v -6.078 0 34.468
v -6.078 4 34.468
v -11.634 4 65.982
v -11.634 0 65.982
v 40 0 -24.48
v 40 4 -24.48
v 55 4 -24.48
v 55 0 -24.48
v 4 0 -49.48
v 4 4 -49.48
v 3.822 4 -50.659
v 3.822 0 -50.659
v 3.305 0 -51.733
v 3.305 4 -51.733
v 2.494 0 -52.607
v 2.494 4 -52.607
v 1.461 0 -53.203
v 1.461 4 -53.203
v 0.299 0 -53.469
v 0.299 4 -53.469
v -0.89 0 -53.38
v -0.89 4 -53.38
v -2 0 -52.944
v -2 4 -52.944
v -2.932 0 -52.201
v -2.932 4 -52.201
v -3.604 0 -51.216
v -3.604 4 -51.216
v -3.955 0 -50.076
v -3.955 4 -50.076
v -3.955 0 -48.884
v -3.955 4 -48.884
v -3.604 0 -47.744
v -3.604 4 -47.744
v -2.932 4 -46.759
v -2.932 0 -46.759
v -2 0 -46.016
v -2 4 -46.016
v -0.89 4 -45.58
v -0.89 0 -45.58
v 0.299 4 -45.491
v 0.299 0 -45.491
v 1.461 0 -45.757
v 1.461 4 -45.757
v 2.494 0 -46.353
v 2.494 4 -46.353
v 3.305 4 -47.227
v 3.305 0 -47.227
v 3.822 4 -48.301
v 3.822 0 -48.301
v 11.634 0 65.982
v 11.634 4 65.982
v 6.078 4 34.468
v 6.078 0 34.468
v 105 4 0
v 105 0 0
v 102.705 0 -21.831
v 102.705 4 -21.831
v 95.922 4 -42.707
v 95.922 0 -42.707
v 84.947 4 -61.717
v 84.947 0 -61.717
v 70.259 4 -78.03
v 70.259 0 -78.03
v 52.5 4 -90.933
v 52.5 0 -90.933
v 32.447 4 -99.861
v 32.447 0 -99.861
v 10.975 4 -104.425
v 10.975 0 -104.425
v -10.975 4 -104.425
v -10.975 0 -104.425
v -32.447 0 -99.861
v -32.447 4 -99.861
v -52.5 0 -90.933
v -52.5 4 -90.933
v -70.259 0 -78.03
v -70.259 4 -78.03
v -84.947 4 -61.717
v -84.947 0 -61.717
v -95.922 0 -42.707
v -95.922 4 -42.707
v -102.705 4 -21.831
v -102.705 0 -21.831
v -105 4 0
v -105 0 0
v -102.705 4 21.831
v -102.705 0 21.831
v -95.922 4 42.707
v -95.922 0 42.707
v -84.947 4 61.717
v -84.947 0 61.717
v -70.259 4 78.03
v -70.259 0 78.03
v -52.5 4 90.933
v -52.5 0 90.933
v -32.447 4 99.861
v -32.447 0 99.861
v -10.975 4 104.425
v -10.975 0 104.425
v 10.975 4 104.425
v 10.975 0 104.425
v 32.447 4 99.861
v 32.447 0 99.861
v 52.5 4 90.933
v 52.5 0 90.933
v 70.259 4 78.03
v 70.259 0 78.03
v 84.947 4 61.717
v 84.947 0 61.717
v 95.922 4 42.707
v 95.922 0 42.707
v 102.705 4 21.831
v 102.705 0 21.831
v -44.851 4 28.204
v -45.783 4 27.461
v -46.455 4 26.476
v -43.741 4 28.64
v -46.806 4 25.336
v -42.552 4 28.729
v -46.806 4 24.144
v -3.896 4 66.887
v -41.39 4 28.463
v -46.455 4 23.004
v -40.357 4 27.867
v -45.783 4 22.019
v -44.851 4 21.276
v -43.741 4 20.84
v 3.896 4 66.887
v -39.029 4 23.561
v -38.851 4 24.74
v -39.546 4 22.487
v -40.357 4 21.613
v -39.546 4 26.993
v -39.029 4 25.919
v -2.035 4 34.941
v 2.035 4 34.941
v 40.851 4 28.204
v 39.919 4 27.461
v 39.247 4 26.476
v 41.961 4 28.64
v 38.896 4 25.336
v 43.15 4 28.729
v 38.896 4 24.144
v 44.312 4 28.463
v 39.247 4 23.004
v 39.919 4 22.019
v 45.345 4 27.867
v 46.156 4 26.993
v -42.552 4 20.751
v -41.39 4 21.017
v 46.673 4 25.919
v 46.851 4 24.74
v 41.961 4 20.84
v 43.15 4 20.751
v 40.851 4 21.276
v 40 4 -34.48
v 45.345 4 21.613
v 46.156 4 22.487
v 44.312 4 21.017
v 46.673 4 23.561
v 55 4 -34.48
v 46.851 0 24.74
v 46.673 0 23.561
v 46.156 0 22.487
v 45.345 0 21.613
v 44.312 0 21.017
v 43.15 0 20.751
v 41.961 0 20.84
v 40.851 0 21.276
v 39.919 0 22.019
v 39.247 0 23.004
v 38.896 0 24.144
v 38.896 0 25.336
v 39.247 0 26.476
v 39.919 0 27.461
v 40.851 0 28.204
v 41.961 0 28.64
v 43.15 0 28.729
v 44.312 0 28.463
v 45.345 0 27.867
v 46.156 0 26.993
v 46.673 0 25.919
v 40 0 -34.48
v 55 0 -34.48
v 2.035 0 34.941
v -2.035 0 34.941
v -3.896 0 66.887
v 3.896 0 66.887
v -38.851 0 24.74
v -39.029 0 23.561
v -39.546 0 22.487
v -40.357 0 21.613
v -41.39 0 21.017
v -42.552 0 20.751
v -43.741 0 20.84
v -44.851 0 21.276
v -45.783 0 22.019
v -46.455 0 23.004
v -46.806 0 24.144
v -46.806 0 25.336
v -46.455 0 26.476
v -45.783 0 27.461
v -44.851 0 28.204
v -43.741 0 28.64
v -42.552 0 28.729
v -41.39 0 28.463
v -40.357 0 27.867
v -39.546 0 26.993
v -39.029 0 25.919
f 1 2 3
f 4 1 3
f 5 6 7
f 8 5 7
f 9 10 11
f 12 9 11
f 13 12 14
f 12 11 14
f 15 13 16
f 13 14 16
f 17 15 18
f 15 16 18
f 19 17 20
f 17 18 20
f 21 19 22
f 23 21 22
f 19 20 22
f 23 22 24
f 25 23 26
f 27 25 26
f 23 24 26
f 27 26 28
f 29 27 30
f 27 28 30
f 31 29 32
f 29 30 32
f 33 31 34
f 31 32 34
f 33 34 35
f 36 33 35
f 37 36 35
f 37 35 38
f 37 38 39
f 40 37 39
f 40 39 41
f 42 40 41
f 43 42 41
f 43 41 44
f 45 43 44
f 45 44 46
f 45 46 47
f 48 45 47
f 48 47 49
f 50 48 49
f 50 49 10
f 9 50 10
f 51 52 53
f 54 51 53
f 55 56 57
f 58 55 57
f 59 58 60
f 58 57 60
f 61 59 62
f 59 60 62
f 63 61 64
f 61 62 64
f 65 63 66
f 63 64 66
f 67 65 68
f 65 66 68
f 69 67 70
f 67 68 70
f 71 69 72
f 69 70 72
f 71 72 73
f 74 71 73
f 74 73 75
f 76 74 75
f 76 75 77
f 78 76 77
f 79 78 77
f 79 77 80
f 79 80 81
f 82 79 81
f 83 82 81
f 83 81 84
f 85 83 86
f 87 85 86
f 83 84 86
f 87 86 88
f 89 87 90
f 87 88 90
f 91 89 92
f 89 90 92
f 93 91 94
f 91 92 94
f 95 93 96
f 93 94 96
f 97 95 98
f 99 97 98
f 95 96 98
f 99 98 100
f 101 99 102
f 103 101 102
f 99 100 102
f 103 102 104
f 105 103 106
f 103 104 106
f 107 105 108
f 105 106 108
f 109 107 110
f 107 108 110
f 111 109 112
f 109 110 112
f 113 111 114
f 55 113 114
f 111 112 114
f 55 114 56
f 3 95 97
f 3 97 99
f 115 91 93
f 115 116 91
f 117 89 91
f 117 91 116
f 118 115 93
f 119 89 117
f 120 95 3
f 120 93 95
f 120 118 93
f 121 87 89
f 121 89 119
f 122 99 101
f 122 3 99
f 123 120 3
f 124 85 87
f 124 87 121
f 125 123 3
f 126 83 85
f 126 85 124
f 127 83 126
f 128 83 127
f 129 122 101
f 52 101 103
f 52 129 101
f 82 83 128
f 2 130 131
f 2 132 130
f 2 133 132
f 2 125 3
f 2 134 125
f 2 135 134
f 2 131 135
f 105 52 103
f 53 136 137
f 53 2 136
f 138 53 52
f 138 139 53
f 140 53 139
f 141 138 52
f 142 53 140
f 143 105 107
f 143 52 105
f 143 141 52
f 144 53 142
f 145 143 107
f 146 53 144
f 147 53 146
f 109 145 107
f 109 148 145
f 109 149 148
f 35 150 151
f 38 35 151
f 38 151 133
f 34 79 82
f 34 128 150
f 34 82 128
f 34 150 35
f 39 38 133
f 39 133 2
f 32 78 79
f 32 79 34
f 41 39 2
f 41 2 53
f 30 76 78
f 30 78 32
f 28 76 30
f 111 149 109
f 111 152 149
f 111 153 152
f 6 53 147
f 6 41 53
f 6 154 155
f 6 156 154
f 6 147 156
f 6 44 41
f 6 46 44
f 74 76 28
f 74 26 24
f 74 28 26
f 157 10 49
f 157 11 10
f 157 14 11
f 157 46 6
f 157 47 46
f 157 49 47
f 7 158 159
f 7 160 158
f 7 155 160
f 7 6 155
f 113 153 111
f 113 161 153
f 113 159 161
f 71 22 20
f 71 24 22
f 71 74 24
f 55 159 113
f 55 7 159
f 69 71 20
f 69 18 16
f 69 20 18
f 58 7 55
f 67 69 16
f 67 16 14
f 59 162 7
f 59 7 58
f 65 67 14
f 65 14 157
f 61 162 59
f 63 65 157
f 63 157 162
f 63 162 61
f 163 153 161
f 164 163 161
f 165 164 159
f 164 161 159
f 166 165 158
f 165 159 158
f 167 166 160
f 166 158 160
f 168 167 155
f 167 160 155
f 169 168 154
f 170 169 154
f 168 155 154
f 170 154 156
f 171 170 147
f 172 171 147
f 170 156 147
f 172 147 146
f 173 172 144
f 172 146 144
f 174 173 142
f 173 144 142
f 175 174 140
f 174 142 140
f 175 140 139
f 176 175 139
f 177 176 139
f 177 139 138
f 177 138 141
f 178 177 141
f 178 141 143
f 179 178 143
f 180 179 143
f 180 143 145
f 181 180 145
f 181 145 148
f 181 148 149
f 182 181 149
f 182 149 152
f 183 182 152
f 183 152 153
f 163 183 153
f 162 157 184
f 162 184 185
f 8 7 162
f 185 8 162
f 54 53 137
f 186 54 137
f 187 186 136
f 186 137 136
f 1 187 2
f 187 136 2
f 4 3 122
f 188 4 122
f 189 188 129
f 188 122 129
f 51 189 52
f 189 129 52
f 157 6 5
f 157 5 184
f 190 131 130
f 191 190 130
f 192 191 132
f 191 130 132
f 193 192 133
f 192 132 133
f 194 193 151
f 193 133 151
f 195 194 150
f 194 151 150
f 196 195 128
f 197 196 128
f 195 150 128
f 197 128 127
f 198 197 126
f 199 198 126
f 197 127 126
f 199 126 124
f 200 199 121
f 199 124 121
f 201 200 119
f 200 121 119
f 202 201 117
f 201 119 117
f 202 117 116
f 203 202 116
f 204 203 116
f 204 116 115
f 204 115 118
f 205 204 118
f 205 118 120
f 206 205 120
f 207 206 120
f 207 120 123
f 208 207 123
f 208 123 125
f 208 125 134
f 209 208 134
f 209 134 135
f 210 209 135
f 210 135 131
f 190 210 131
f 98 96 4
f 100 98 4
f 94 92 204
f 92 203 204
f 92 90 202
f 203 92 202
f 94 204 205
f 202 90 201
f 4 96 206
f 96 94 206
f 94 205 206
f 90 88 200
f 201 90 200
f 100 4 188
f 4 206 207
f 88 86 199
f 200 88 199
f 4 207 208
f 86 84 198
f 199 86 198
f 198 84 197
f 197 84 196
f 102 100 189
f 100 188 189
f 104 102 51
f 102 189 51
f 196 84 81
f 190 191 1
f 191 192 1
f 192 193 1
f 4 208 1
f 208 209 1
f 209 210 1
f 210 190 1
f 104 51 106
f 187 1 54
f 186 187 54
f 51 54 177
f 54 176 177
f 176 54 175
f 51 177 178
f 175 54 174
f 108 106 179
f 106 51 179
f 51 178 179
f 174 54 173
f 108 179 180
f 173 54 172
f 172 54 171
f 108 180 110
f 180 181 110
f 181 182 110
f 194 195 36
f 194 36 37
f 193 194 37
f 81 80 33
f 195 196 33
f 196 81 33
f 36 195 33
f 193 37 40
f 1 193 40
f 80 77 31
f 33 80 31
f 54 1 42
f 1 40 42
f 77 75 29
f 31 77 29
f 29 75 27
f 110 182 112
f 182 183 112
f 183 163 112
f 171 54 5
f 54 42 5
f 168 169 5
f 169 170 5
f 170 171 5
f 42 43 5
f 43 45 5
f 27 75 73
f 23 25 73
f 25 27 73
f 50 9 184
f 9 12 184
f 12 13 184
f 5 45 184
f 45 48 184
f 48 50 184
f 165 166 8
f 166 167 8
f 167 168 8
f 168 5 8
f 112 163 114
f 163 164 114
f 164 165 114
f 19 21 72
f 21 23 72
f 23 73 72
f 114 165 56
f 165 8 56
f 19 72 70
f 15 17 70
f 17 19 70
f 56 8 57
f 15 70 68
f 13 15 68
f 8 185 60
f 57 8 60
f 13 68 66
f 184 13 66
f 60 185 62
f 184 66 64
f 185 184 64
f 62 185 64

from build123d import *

# Parameters (mm, degrees)
ESBO_O1_R                = 105
RESSALTO_EXTRUS_O1_DEPTH = 4
CORTE_EXTRUS_O1_DEPTH    = 5
ESBO_O3_R                = 4
CORTE_EXTRUS_O2_DEPTH    = 5
CORTE_EXTRUS_O3_REACH    = 6
ESBO_O4_W                = 15
ESBO_O4_H                = 10


with BuildPart() as part:
    # Esboço1 → Ressalto-extrusão1 (new body)
    with BuildSketch(Plane(origin=(0, 0, 0), x_dir=(1, 0, 0), z_dir=(0, 1, 0))):
        Circle(ESBO_O1_R)
    extrude(amount=RESSALTO_EXTRUS_O1_DEPTH)

    # Esboço2 → Corte-extrusão1 (cut, through all)
    with BuildSketch(Plane(origin=(0, 4, 0), x_dir=(1, 0, 0), z_dir=(0, 1, 0))):
        with BuildLine():
            Line((-6.077686218, -34.468271355), (-11.634427904, -65.982119452))
            ThreePointArc((-11.634427904, -65.982119452), (0, -67), (11.634427904, -65.982119452))
            Line((11.634427904, -65.982119452), (6.077686218, -34.468271355))
            ThreePointArc((6.077686218, -34.468271355), (0, -35), (-6.077686218, -34.468271355))
        make_face()
    extrude(amount=-CORTE_EXTRUS_O1_DEPTH, mode=Mode.SUBTRACT)

    # Esboço3 → Corte-extrusão2 (cut, through all)
    with BuildSketch(Plane(origin=(0, 4, 0), x_dir=(1, 0, 0), z_dir=(0, 1, 0))):
        with Locations((42.850936979, -24.74)):
            Circle(ESBO_O3_R)
        with Locations((0, 49.48)):
            Circle(ESBO_O3_R)
        with Locations((-42.850936979, -24.74)):
            Circle(ESBO_O3_R)
    extrude(amount=-CORTE_EXTRUS_O2_DEPTH, mode=Mode.SUBTRACT)

    # Esboço4 → Corte-extrusão3 (cut, up to next)
    with BuildSketch(Plane(origin=(0, 4, 0), x_dir=(1, 0, 0), z_dir=(0, 1, 0)), mode=Mode.PRIVATE) as corte_extrus_o3_sk1:
        with Locations((47.5, 29.48)):
            Rectangle(ESBO_O4_W, ESBO_O4_H)
    corte_extrus_o3_tool1 = extrude(corte_extrus_o3_sk1.sketch, amount=-CORTE_EXTRUS_O3_REACH, mode=Mode.PRIVATE) & part.part
    add(corte_extrus_o3_tool1.solids().sort_by_distance((47.5, 4, -29.48))[0], mode=Mode.SUBTRACT)


solid = part.part
